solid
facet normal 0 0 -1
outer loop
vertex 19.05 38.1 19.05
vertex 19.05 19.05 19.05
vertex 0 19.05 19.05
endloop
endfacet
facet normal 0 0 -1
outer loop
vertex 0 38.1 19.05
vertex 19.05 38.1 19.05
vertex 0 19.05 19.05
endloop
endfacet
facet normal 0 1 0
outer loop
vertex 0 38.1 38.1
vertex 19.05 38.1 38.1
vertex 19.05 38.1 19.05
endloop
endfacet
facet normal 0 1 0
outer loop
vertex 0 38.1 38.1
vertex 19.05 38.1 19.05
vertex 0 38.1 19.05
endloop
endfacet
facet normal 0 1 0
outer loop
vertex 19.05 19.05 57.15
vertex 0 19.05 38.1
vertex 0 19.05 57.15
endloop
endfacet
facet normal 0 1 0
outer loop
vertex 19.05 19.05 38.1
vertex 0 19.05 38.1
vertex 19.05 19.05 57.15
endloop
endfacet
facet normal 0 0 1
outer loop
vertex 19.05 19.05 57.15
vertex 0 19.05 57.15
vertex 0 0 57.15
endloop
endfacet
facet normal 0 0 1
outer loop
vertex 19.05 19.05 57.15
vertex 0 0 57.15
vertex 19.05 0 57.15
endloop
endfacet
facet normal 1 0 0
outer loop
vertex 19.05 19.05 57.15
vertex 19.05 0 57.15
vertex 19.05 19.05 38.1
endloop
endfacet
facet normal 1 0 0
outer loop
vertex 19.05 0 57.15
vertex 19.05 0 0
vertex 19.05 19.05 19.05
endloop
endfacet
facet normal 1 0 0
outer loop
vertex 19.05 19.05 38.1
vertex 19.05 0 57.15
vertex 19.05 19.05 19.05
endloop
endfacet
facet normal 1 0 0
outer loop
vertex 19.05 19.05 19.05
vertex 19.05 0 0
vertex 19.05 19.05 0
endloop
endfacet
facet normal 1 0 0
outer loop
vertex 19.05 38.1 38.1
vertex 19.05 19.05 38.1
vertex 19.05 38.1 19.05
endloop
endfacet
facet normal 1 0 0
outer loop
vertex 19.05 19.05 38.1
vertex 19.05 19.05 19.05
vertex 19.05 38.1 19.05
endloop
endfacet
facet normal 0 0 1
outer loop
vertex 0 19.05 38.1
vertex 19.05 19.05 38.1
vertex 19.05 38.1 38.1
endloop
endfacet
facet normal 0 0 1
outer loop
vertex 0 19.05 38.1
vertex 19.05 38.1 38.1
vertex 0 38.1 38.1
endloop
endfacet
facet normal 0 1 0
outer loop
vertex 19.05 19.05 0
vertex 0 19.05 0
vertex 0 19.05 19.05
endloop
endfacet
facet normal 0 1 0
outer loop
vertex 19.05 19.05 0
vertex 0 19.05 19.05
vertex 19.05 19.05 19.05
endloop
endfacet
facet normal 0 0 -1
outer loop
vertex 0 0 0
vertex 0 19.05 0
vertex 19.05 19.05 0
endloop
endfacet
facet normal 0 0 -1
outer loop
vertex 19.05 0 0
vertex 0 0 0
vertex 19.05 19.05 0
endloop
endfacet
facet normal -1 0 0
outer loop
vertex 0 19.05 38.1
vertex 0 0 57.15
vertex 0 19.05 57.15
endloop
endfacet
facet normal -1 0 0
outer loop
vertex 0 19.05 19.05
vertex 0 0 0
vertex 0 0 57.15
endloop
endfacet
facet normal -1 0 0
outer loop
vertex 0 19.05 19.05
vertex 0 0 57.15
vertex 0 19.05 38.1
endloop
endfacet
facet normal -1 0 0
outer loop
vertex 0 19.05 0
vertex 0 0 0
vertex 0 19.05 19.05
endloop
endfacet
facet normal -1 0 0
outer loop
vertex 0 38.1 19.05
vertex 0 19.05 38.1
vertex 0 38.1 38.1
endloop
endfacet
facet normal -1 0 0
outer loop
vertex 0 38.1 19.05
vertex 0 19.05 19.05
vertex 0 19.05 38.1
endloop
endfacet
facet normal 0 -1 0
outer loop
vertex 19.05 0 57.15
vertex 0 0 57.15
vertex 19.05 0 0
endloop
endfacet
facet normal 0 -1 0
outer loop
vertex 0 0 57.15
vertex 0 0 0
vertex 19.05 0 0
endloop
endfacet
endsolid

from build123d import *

# Parameters (mm, degrees)
F0_W     = 19.05
F0_H     = 19.05
F1_DEPTH = 19.05
F2_DEPTH = 19.05
F3_W     = 19.05
F3_H     = 19.05
F4_DEPTH = 19.05
F5_W     = 19.05
F5_H     = 19.05
F6_DEPTH = 19.05


with BuildPart() as f1:
    # F0 (on Top) → F1 (new body)
    with BuildSketch(Plane.XY):
        with Locations((9.525, 9.525)):
            Rectangle(F0_W, F0_H)
    extrude(amount=F1_DEPTH)

    # F2 (add): a face of the model
    f2_faces = [f1.faces().sort_by_distance(p)[0] for p in [
        (9.525, 9.525, 19.05),
    ]]
    extrude(f2_faces, amount=F2_DEPTH)

    # F3 (on face) → F4 (join)
    with BuildSketch(Plane(origin=(0, 19.05, 0), x_dir=(-1, 0, 0), z_dir=(0, 1, 0))):
        with Locations((-9.525, 28.575)):
            Rectangle(F3_W, F3_H)
    extrude(amount=F4_DEPTH)

    # F5 (on face) → F6 (join)
    with BuildSketch(Plane.XY.offset(38.1)):
        with Locations((9.525, 9.525)):
            Rectangle(F5_W, F5_H)
    extrude(amount=F6_DEPTH)


solid = f1.part
